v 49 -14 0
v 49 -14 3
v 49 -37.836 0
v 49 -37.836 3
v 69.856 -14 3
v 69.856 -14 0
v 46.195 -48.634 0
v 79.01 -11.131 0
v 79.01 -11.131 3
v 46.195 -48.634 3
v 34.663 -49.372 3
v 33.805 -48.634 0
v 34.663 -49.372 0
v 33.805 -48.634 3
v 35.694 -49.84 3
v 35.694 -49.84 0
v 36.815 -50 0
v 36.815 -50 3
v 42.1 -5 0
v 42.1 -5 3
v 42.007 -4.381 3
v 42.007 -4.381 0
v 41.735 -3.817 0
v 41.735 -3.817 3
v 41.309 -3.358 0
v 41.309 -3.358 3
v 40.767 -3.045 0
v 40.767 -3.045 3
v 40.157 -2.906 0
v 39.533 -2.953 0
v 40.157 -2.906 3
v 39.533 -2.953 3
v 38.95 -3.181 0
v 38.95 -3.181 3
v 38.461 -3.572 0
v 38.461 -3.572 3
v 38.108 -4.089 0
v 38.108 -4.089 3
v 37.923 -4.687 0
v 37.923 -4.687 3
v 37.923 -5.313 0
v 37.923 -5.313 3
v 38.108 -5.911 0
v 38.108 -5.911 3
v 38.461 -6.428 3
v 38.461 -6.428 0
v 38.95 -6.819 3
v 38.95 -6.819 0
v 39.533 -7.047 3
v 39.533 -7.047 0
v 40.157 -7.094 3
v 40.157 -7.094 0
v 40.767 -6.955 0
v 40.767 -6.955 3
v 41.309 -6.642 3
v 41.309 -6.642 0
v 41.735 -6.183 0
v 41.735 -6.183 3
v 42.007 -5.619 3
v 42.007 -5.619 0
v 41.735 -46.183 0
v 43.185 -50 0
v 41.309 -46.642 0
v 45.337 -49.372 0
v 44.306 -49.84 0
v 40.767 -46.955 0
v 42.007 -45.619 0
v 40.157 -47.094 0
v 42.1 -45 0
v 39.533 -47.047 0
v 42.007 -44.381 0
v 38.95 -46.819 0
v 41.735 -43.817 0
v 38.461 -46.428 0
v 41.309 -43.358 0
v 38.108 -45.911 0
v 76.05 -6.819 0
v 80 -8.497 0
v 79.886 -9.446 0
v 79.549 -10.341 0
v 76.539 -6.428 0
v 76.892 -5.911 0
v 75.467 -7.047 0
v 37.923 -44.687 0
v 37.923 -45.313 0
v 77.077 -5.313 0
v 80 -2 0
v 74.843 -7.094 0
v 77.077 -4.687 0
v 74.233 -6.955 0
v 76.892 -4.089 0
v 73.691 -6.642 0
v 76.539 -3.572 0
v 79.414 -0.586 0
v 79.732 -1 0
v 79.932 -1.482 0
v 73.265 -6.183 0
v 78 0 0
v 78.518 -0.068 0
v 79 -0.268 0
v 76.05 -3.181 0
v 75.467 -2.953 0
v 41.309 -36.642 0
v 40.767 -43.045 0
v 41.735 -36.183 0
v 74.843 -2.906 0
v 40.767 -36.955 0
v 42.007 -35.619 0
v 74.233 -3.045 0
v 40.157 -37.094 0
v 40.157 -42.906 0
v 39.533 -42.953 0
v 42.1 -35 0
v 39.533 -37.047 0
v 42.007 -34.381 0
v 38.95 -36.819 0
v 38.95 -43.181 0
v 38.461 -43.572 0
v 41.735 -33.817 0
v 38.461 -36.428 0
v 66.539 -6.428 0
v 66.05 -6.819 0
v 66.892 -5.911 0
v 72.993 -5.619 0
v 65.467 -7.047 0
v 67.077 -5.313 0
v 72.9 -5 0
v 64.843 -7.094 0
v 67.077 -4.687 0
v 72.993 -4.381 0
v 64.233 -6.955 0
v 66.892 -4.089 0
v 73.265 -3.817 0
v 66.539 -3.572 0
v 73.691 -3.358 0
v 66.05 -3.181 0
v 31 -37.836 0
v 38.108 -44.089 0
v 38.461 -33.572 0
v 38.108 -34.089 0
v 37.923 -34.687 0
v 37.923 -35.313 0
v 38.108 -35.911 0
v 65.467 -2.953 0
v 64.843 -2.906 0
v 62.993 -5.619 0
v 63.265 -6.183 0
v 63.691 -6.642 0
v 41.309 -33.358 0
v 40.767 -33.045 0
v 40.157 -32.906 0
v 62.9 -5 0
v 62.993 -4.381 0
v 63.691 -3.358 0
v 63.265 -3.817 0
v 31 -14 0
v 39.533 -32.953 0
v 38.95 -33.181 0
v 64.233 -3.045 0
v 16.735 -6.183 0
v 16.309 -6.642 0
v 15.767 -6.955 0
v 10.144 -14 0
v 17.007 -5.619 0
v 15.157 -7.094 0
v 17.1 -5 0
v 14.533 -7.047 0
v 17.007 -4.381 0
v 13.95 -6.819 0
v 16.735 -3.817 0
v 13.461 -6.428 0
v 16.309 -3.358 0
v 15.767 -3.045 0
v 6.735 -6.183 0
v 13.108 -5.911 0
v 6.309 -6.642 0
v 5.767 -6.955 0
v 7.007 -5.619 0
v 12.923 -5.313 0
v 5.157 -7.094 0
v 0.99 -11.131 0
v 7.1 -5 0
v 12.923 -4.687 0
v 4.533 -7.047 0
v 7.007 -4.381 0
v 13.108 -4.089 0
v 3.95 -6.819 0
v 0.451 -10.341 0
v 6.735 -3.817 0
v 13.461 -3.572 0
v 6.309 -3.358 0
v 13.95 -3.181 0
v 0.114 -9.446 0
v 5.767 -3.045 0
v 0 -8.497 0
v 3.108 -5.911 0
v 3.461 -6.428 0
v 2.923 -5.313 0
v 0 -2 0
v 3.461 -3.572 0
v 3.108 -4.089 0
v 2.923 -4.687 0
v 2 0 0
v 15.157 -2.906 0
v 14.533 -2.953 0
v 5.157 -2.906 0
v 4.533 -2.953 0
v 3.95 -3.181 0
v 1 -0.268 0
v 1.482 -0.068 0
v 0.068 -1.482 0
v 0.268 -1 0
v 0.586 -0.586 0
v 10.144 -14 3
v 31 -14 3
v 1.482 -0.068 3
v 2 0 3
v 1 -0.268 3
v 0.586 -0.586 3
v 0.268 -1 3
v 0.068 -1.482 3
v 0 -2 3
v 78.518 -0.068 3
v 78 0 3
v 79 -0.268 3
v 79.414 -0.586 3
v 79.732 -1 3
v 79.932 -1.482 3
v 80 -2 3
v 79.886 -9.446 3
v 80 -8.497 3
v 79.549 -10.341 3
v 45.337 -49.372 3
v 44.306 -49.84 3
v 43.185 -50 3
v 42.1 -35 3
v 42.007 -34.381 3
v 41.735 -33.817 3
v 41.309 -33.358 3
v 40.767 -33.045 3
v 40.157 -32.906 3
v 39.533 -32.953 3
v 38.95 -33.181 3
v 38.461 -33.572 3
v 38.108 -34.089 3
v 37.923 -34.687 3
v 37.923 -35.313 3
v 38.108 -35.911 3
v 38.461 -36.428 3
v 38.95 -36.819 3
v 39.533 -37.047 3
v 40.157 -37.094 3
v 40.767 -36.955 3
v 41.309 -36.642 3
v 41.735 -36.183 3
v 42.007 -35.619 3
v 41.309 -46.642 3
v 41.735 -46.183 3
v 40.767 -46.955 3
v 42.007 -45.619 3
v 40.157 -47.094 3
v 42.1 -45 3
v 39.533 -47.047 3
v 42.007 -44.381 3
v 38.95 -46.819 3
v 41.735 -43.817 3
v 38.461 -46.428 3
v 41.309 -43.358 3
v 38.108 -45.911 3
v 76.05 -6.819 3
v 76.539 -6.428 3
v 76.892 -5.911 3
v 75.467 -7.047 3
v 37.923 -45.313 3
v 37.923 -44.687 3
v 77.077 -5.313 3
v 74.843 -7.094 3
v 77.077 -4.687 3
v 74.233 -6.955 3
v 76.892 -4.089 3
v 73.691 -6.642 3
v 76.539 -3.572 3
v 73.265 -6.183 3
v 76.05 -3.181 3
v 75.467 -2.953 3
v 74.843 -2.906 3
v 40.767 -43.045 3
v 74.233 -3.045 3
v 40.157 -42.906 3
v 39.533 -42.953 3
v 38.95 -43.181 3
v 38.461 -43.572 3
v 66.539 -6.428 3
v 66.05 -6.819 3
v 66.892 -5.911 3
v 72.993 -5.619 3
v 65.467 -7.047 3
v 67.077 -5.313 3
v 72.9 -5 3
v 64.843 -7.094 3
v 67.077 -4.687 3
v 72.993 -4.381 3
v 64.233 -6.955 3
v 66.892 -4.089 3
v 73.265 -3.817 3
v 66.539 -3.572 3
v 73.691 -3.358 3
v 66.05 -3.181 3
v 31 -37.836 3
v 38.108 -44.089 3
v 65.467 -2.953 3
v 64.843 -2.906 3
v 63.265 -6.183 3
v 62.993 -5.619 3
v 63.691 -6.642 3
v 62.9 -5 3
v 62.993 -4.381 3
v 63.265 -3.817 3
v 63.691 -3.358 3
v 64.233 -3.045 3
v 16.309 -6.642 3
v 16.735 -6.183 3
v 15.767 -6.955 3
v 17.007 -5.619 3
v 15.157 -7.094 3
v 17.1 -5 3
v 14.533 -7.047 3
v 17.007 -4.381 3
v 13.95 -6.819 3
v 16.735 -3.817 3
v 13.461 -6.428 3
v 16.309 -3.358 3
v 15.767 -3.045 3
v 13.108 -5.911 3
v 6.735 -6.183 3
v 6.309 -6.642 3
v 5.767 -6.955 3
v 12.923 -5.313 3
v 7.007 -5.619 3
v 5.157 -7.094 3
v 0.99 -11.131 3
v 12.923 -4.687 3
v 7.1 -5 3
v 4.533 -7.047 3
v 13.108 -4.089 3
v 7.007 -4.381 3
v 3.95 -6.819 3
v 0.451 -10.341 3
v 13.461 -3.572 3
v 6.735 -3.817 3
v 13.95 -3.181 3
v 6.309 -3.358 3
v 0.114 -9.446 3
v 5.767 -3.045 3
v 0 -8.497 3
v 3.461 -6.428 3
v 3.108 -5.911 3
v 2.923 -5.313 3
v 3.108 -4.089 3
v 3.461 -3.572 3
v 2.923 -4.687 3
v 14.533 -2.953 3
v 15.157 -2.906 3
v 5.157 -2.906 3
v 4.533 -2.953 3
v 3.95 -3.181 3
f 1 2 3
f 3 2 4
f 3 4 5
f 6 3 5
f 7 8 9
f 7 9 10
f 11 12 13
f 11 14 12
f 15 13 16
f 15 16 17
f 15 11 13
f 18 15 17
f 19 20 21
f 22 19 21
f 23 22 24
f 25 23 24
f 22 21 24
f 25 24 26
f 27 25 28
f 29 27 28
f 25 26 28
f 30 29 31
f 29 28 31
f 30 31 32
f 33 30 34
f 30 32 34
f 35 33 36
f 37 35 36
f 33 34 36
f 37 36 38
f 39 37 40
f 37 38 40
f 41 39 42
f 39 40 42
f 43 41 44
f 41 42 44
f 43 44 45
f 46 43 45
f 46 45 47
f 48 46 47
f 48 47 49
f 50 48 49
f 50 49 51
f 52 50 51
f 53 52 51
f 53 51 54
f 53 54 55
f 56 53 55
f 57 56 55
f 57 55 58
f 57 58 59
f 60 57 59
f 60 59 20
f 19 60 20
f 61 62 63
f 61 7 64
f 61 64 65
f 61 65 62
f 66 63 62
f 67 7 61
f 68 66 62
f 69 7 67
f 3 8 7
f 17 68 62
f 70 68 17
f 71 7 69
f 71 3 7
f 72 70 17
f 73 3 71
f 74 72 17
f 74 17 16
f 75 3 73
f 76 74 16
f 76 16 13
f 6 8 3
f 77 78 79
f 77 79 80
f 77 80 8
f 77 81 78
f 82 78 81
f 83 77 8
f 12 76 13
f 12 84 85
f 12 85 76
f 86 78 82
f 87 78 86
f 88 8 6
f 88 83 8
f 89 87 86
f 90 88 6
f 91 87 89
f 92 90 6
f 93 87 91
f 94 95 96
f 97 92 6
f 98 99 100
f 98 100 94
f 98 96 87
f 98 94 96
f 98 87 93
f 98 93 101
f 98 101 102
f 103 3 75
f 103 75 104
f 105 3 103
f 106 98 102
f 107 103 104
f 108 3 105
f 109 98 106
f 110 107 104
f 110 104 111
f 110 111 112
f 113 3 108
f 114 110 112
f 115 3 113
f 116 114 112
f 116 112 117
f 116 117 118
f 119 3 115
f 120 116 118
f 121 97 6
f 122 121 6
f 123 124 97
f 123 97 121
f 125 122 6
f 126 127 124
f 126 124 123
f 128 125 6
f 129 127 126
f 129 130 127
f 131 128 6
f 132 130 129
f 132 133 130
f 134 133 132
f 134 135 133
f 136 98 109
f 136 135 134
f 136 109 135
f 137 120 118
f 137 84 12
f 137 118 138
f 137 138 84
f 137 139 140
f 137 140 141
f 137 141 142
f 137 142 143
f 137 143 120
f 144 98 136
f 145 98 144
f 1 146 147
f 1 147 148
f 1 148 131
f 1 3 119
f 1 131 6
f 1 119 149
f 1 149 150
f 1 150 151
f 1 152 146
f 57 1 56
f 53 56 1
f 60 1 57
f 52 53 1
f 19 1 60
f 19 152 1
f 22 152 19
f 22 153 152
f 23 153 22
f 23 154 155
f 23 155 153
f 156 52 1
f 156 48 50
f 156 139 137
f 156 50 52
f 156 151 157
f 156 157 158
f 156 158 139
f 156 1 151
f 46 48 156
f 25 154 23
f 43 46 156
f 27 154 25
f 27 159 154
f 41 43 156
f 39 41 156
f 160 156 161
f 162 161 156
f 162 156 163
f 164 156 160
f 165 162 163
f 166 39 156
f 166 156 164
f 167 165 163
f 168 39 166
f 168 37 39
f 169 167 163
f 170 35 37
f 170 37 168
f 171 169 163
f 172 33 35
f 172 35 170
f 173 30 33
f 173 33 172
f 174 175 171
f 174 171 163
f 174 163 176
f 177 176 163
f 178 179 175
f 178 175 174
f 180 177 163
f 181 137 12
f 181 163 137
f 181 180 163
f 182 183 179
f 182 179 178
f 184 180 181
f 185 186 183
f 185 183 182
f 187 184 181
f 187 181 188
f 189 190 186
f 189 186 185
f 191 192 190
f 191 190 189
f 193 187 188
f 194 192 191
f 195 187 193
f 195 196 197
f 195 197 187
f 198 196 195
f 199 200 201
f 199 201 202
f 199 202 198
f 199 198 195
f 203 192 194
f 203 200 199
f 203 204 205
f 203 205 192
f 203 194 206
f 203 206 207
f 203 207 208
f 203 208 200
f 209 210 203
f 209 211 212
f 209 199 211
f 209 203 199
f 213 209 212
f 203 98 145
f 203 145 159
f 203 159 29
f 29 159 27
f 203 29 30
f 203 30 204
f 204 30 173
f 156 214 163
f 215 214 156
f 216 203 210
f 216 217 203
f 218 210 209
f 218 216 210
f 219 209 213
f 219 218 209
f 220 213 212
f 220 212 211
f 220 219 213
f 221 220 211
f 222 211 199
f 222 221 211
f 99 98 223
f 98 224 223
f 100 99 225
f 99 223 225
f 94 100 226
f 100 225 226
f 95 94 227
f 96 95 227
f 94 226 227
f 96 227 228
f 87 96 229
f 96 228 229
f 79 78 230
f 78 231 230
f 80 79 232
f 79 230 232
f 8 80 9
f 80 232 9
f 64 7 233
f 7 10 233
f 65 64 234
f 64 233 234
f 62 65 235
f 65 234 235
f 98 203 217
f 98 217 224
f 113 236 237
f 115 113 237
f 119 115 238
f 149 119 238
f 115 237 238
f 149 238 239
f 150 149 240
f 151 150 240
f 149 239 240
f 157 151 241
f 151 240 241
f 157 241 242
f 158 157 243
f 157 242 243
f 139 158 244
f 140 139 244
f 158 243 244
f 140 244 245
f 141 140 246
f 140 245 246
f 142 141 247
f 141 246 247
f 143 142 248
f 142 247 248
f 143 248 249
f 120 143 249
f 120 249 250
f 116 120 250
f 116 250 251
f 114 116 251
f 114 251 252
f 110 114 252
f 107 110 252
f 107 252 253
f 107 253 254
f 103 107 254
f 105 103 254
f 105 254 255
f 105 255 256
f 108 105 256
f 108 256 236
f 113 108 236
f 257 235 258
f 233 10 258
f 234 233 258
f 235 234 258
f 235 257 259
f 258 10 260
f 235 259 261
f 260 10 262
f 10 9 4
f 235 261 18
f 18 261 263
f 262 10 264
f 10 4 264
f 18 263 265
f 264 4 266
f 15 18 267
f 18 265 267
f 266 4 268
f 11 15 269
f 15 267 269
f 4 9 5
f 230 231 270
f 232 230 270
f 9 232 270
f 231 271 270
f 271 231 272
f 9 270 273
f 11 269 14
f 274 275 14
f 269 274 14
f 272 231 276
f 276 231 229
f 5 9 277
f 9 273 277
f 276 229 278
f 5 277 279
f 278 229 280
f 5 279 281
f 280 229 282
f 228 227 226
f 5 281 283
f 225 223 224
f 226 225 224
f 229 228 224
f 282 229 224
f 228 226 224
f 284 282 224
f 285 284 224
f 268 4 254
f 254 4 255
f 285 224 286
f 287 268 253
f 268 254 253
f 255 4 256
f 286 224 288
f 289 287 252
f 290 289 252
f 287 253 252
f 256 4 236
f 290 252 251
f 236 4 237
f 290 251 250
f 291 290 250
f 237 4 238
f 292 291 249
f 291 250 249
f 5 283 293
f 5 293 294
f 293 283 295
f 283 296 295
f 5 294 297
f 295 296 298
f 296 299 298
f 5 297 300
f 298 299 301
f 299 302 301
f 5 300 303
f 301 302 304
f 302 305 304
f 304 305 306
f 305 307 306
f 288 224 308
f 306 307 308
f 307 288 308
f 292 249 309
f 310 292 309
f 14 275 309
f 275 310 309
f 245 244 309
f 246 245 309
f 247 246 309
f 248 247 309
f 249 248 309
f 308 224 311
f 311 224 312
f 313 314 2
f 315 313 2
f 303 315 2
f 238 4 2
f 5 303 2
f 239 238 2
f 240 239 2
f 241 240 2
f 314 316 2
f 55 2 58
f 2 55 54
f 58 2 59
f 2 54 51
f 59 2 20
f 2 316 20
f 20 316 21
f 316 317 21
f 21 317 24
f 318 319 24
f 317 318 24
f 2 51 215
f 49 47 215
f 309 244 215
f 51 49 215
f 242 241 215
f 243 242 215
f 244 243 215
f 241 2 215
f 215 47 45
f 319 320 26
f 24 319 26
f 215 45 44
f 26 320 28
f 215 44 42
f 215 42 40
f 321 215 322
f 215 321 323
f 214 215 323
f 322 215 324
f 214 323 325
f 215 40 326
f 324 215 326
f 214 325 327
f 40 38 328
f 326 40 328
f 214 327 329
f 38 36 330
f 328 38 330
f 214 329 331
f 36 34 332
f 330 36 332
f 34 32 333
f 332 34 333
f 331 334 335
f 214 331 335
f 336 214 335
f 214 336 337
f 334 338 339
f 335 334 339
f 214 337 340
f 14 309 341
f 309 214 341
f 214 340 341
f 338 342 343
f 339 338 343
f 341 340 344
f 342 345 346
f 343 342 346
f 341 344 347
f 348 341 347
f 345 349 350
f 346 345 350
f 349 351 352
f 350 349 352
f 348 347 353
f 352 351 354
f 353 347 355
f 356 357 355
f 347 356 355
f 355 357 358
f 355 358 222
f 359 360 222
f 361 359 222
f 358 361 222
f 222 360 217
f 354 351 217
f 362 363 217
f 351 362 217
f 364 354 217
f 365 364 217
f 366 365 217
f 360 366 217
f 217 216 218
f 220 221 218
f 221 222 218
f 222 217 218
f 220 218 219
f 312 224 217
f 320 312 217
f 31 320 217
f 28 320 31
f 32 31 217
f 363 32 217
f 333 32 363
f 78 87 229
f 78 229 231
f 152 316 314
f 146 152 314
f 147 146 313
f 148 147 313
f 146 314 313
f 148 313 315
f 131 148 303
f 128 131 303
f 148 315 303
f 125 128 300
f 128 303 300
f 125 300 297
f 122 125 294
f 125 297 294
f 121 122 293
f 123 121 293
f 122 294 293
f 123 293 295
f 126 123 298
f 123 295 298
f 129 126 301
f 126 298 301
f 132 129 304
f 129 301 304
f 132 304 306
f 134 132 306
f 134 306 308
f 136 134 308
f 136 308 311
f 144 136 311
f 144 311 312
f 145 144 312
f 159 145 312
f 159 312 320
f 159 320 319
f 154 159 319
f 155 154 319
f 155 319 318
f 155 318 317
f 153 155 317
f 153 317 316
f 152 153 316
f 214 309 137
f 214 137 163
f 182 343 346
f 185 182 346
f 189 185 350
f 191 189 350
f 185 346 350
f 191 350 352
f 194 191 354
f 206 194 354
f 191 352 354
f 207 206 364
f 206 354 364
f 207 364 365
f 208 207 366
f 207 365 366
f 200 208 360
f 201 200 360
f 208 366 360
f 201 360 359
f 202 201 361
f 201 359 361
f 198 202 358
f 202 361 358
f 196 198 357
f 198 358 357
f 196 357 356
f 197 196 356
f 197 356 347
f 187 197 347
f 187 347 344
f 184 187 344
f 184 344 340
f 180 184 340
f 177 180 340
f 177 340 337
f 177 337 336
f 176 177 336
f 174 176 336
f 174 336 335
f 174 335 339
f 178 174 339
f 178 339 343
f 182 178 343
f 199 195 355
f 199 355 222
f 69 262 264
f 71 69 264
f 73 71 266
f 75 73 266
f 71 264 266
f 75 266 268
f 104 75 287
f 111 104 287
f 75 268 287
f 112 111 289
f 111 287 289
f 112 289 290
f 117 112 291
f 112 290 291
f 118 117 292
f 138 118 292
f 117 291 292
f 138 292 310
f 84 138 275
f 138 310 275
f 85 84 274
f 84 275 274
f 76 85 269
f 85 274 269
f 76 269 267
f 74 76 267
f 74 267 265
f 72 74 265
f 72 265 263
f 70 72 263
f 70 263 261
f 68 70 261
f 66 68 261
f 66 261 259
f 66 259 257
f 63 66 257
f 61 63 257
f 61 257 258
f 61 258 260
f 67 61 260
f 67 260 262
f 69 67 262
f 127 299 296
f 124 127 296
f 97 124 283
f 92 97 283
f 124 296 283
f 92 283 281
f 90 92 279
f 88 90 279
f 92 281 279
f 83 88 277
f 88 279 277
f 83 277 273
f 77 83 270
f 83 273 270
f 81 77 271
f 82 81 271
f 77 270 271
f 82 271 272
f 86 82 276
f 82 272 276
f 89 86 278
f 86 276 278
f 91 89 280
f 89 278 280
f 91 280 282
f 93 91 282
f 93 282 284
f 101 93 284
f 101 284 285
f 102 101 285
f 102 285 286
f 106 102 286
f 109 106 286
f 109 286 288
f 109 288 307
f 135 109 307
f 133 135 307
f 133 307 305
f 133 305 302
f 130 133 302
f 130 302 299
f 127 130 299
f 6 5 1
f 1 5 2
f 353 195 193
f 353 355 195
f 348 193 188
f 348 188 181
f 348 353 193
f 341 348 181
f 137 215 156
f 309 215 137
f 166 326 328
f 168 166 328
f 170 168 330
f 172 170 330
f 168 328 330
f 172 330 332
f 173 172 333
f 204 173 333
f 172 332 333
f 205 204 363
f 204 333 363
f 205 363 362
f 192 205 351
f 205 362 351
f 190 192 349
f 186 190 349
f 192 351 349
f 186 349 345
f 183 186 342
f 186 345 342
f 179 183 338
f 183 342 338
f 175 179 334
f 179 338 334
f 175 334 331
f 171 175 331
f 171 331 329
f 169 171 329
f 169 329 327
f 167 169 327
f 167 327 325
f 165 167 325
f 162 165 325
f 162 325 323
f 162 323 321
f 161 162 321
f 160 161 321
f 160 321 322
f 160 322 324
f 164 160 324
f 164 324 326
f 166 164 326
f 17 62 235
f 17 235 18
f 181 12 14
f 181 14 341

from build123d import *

# Parameters (mm, degrees)
EXTRUDE_1_DEPTH     = 3
SKETCH_2_R          = 2.1
CUT_EXTRUDE_1_DEPTH = 95.387499172
CUT_EXTRUDE_2_DEPTH = 95.387499172
FILLET_1_R          = 2
FILLET_2_R          = 4


with BuildPart() as part:
    # 草图1 → 凸台-拉伸1 (new body)
    with BuildSketch(Plane.XY):
        Polygon((0, 0), (80, 0), (80, -10), (45, -50), (35, -50), (0, -10), align=None)
    extrude(amount=EXTRUDE_1_DEPTH)

    # 草图2 → 切除-拉伸1 (cut, through all)
    with BuildSketch(Plane.XY.offset(3)):
        with Locations((5, -5)):
            Circle(SKETCH_2_R)
        with Locations((15, -5)):
            Circle(SKETCH_2_R)
        with Locations(Location((65, -5, 0), (0, 0, 180))):
            Circle(SKETCH_2_R)
        with Locations(Location((75, -5, 0), (0, 0, 180))):
            Circle(SKETCH_2_R)
        with Locations((40, -45)):
            Circle(SKETCH_2_R)
        with Locations((40, -35)):
            Circle(SKETCH_2_R)
        with Locations((40, -5)):
            Circle(SKETCH_2_R)
    extrude(amount=-CUT_EXTRUDE_1_DEPTH, mode=Mode.SUBTRACT)

    # 草图3 → 切除-拉伸2 (cut, through all)
    with BuildSketch(Plane.XY.offset(3)):
        Polygon((10.143841133, -14), (31, -14), (31, -37.835610134), align=None)
        Polygon((49, -37.835610134), (69.856158867, -14), (49, -14), align=None)
    extrude(amount=-CUT_EXTRUDE_2_DEPTH, mode=Mode.SUBTRACT)

    # 圆角1
    fillet_1_edges = [part.edges().sort_by_distance(p)[0] for p in [
        (0, 0, 1.5),
        (80, 0, 1.5),
    ]]
    fillet(fillet_1_edges, radius=FILLET_1_R)

    # 圆角2
    fillet_2_edges = [part.edges().sort_by_distance(p)[0] for p in [
        (80, -10, 1.5),
        (45, -50, 1.5),
        (35, -50, 1.5),
        (0, -10, 1.5),
    ]]
    fillet(fillet_2_edges, radius=FILLET_2_R)


solid = part.part
